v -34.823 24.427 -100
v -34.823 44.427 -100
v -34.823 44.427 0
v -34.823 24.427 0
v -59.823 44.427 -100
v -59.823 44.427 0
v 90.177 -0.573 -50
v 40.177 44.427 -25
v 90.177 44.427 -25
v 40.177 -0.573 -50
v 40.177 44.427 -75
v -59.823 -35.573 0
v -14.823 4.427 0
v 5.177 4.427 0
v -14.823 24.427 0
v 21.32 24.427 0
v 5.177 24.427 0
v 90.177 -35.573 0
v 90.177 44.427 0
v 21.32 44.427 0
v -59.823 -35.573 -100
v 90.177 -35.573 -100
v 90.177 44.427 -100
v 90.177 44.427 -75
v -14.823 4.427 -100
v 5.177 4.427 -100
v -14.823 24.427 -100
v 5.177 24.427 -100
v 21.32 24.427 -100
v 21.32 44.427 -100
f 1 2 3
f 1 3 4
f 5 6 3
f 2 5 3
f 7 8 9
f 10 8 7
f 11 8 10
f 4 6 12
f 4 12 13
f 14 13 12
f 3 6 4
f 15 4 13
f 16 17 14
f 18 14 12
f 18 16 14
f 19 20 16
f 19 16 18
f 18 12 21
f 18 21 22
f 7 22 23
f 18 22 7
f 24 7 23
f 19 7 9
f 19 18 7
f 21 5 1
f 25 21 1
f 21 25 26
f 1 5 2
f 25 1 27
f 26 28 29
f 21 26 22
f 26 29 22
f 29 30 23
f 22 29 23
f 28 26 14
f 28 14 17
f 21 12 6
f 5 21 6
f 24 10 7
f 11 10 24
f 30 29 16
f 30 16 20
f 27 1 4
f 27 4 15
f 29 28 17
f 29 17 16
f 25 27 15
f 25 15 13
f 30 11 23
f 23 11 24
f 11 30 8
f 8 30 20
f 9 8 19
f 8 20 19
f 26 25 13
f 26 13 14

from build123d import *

# Parameters (mm, degrees)
SKETCH2_W               = 150
SKETCH2_H               = 80
BOSS_EXTRUDE1_DEPTH     = 100
CUT_EXTRUDE1_DEPTH      = 142.794426811
CUT_EXTRUDE1_DEPTH_BACK = 100
CUT_EXTRUDE2_DEPTH      = 186.671040169
CUT_EXTRUDE2_DEPTH_BACK = 50


with BuildPart() as part:
    # Sketch2 → Boss-Extrude1 (new body)
    with BuildSketch(Plane.XY):
        with Locations((15.177182909, 4.426739215)):
            Rectangle(SKETCH2_W, SKETCH2_H)
    extrude(amount=-BOSS_EXTRUDE1_DEPTH)

    # Sketch3 → Cut-Extrude1 (cut, two sides: drawn at the far end of the back side and taken through both)
    with BuildSketch(Plane.XY.offset(-CUT_EXTRUDE1_DEPTH_BACK)):
        Polygon((-409.822817091, 44.426739215), (-59.822817091, 44.426739215), (-34.822817091, 44.426739215), (-34.822817091, 24.426739215), (-14.822817091, 24.426739215), (-14.822817091, 4.426739215), (5.177182909, 4.426739215), (5.177182909, 24.426739215), (21.319701193, 24.426739215), (21.319701193, 44.426739215), (21.319701193, 394.426739215), (-419.864809368, 937.89359896), (-851.007327651, 587.89359896), align=None)
    extrude(amount=CUT_EXTRUDE1_DEPTH + CUT_EXTRUDE1_DEPTH_BACK, mode=Mode.SUBTRACT)

    # Sketch5 → Cut-Extrude2 (cut, two sides: drawn at the far end of the back side and taken through both)
    with BuildSketch(Plane(origin=(90.177182909, 0, 0), x_dir=(0, 0, -1), z_dir=(1, 0, 0)).offset(-CUT_EXTRUDE2_DEPTH_BACK)):
        Polygon((-86.366239295, 244.885969946), (25, 44.426739215), (50, -0.573260785), (75, 44.426739215), (186.366239295, 244.885969946), (186.366239295, 703.520213935), (-86.366239295, 703.520213935), align=None)
    extrude(amount=CUT_EXTRUDE2_DEPTH + CUT_EXTRUDE2_DEPTH_BACK, mode=Mode.SUBTRACT)


solid = part.part
